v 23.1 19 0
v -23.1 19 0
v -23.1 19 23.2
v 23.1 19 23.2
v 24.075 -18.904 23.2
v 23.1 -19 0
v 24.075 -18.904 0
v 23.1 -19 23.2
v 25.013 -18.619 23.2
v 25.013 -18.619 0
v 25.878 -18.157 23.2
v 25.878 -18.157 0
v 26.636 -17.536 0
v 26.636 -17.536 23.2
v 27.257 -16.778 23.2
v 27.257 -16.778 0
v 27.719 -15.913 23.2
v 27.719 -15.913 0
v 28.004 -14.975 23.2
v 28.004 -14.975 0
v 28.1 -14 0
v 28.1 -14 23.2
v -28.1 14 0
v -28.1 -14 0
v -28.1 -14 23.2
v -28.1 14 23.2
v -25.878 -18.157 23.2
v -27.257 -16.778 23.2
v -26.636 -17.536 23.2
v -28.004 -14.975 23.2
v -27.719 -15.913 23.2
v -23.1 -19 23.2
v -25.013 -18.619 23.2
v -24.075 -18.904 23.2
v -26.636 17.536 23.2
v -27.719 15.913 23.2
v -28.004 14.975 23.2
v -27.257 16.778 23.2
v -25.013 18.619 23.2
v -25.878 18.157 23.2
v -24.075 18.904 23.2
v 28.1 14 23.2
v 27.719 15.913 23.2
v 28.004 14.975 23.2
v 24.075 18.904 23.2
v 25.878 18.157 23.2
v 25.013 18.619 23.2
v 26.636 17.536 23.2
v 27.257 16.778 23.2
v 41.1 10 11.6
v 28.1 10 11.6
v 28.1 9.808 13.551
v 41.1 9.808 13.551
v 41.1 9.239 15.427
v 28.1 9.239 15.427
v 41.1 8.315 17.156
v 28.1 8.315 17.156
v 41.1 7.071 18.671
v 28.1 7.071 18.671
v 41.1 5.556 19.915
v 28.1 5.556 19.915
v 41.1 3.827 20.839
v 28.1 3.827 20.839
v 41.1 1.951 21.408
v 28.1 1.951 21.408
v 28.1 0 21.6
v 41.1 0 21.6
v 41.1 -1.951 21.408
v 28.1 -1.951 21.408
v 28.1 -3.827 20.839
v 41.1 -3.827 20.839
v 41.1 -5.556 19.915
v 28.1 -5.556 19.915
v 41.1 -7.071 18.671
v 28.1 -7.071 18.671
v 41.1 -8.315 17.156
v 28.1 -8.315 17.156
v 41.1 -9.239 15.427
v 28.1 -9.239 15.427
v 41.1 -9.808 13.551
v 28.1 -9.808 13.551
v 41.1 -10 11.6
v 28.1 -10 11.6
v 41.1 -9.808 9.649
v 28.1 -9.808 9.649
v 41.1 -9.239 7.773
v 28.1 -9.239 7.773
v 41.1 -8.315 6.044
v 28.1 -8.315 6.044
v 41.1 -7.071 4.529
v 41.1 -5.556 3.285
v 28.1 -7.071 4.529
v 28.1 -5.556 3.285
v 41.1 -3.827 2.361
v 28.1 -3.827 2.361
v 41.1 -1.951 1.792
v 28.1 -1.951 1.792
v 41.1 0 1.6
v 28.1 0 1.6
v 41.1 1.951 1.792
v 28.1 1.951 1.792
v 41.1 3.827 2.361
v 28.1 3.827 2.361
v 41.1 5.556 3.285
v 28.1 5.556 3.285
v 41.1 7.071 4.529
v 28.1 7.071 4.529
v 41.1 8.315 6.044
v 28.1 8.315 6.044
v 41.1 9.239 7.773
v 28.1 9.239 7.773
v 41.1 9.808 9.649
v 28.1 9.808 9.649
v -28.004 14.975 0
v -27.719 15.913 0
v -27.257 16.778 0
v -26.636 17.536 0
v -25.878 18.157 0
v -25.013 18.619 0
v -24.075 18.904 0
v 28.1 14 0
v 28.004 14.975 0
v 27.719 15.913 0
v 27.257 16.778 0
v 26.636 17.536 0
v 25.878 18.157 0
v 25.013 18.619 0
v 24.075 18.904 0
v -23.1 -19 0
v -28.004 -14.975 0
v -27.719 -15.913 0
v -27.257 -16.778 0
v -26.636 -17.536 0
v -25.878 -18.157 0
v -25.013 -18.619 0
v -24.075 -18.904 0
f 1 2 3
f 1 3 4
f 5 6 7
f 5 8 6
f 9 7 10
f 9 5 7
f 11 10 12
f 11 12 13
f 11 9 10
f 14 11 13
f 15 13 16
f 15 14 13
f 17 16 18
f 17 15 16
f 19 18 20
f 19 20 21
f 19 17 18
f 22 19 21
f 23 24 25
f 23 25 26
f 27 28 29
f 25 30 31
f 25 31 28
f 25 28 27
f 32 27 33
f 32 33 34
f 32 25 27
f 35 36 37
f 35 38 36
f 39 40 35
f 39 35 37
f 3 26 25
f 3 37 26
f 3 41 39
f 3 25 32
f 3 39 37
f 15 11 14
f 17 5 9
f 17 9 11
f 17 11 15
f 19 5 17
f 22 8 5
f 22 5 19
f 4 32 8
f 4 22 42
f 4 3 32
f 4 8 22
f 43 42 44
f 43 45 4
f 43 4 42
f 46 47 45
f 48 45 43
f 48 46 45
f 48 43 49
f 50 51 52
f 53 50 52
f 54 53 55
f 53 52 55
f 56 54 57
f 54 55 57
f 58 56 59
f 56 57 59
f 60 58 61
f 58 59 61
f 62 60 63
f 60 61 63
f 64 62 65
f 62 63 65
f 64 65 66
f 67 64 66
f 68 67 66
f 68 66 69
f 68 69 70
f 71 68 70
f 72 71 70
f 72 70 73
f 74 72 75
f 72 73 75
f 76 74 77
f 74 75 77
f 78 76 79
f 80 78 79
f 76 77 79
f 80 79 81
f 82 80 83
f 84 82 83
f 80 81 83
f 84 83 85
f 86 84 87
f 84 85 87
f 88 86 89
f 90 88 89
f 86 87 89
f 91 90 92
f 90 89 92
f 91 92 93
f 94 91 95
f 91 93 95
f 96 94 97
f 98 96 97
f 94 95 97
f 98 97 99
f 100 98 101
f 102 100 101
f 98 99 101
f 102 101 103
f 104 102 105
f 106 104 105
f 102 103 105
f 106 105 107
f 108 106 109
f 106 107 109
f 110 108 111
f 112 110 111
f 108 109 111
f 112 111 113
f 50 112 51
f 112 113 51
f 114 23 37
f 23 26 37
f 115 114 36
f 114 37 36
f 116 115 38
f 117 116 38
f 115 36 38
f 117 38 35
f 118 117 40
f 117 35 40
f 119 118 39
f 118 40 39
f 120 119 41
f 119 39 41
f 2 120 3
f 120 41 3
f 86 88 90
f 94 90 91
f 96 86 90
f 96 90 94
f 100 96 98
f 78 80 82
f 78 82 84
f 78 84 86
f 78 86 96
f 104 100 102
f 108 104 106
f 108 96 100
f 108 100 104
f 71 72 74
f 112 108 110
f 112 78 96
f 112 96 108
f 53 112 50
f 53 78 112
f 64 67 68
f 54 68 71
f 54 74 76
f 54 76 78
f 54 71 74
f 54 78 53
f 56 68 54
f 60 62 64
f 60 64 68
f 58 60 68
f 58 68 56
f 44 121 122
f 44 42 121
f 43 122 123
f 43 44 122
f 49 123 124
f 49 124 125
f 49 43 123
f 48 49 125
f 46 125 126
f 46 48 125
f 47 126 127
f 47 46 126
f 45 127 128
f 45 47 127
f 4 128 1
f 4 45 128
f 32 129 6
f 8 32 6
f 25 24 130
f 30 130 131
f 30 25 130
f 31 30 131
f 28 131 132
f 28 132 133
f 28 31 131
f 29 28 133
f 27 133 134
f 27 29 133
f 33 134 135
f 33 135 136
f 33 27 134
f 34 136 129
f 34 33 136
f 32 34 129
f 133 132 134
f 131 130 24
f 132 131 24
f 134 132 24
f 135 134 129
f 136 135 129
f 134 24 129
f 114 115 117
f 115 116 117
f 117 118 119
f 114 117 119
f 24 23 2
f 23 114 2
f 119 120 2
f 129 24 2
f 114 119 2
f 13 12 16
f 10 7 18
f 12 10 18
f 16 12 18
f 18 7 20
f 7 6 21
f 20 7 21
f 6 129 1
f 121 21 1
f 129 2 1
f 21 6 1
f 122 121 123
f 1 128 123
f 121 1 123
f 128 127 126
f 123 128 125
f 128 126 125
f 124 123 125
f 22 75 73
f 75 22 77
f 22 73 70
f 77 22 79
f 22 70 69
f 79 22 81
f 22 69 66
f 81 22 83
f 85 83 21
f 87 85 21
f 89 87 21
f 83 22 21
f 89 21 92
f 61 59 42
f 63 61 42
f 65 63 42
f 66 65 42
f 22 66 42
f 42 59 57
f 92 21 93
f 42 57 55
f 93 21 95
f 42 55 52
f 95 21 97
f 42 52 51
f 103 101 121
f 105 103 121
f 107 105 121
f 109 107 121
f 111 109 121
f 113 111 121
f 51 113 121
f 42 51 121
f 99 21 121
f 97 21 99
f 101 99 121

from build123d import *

# Parameters (mm, degrees)
F0_W     = 56.2
F0_H     = 38
F1_DEPTH = 23.2
F2_R     = 5
F3_R     = 10
F4_DEPTH = 13


with BuildPart() as f1:
    # F0 (on Top) → F1 (new body)
    with BuildSketch(Plane.XY):
        Rectangle(F0_W, F0_H)
    extrude(amount=F1_DEPTH)

    # F2
    f2_edges = [f1.edges().sort_by_distance(p)[0] for p in [
        (28.1, -19, 11.6),
        (28.1, 19, 11.6),
        (-28.1, 19, 11.6),
        (-28.1, -19, 11.6),
    ]]
    fillet(f2_edges, radius=F2_R)

    # F3 (on face) → F4 (join)
    with BuildSketch(Plane.YZ.offset(28.1)):
        with Locations((0, 11.6)):
            Circle(F3_R)
    extrude(amount=F4_DEPTH)


solid = f1.part
